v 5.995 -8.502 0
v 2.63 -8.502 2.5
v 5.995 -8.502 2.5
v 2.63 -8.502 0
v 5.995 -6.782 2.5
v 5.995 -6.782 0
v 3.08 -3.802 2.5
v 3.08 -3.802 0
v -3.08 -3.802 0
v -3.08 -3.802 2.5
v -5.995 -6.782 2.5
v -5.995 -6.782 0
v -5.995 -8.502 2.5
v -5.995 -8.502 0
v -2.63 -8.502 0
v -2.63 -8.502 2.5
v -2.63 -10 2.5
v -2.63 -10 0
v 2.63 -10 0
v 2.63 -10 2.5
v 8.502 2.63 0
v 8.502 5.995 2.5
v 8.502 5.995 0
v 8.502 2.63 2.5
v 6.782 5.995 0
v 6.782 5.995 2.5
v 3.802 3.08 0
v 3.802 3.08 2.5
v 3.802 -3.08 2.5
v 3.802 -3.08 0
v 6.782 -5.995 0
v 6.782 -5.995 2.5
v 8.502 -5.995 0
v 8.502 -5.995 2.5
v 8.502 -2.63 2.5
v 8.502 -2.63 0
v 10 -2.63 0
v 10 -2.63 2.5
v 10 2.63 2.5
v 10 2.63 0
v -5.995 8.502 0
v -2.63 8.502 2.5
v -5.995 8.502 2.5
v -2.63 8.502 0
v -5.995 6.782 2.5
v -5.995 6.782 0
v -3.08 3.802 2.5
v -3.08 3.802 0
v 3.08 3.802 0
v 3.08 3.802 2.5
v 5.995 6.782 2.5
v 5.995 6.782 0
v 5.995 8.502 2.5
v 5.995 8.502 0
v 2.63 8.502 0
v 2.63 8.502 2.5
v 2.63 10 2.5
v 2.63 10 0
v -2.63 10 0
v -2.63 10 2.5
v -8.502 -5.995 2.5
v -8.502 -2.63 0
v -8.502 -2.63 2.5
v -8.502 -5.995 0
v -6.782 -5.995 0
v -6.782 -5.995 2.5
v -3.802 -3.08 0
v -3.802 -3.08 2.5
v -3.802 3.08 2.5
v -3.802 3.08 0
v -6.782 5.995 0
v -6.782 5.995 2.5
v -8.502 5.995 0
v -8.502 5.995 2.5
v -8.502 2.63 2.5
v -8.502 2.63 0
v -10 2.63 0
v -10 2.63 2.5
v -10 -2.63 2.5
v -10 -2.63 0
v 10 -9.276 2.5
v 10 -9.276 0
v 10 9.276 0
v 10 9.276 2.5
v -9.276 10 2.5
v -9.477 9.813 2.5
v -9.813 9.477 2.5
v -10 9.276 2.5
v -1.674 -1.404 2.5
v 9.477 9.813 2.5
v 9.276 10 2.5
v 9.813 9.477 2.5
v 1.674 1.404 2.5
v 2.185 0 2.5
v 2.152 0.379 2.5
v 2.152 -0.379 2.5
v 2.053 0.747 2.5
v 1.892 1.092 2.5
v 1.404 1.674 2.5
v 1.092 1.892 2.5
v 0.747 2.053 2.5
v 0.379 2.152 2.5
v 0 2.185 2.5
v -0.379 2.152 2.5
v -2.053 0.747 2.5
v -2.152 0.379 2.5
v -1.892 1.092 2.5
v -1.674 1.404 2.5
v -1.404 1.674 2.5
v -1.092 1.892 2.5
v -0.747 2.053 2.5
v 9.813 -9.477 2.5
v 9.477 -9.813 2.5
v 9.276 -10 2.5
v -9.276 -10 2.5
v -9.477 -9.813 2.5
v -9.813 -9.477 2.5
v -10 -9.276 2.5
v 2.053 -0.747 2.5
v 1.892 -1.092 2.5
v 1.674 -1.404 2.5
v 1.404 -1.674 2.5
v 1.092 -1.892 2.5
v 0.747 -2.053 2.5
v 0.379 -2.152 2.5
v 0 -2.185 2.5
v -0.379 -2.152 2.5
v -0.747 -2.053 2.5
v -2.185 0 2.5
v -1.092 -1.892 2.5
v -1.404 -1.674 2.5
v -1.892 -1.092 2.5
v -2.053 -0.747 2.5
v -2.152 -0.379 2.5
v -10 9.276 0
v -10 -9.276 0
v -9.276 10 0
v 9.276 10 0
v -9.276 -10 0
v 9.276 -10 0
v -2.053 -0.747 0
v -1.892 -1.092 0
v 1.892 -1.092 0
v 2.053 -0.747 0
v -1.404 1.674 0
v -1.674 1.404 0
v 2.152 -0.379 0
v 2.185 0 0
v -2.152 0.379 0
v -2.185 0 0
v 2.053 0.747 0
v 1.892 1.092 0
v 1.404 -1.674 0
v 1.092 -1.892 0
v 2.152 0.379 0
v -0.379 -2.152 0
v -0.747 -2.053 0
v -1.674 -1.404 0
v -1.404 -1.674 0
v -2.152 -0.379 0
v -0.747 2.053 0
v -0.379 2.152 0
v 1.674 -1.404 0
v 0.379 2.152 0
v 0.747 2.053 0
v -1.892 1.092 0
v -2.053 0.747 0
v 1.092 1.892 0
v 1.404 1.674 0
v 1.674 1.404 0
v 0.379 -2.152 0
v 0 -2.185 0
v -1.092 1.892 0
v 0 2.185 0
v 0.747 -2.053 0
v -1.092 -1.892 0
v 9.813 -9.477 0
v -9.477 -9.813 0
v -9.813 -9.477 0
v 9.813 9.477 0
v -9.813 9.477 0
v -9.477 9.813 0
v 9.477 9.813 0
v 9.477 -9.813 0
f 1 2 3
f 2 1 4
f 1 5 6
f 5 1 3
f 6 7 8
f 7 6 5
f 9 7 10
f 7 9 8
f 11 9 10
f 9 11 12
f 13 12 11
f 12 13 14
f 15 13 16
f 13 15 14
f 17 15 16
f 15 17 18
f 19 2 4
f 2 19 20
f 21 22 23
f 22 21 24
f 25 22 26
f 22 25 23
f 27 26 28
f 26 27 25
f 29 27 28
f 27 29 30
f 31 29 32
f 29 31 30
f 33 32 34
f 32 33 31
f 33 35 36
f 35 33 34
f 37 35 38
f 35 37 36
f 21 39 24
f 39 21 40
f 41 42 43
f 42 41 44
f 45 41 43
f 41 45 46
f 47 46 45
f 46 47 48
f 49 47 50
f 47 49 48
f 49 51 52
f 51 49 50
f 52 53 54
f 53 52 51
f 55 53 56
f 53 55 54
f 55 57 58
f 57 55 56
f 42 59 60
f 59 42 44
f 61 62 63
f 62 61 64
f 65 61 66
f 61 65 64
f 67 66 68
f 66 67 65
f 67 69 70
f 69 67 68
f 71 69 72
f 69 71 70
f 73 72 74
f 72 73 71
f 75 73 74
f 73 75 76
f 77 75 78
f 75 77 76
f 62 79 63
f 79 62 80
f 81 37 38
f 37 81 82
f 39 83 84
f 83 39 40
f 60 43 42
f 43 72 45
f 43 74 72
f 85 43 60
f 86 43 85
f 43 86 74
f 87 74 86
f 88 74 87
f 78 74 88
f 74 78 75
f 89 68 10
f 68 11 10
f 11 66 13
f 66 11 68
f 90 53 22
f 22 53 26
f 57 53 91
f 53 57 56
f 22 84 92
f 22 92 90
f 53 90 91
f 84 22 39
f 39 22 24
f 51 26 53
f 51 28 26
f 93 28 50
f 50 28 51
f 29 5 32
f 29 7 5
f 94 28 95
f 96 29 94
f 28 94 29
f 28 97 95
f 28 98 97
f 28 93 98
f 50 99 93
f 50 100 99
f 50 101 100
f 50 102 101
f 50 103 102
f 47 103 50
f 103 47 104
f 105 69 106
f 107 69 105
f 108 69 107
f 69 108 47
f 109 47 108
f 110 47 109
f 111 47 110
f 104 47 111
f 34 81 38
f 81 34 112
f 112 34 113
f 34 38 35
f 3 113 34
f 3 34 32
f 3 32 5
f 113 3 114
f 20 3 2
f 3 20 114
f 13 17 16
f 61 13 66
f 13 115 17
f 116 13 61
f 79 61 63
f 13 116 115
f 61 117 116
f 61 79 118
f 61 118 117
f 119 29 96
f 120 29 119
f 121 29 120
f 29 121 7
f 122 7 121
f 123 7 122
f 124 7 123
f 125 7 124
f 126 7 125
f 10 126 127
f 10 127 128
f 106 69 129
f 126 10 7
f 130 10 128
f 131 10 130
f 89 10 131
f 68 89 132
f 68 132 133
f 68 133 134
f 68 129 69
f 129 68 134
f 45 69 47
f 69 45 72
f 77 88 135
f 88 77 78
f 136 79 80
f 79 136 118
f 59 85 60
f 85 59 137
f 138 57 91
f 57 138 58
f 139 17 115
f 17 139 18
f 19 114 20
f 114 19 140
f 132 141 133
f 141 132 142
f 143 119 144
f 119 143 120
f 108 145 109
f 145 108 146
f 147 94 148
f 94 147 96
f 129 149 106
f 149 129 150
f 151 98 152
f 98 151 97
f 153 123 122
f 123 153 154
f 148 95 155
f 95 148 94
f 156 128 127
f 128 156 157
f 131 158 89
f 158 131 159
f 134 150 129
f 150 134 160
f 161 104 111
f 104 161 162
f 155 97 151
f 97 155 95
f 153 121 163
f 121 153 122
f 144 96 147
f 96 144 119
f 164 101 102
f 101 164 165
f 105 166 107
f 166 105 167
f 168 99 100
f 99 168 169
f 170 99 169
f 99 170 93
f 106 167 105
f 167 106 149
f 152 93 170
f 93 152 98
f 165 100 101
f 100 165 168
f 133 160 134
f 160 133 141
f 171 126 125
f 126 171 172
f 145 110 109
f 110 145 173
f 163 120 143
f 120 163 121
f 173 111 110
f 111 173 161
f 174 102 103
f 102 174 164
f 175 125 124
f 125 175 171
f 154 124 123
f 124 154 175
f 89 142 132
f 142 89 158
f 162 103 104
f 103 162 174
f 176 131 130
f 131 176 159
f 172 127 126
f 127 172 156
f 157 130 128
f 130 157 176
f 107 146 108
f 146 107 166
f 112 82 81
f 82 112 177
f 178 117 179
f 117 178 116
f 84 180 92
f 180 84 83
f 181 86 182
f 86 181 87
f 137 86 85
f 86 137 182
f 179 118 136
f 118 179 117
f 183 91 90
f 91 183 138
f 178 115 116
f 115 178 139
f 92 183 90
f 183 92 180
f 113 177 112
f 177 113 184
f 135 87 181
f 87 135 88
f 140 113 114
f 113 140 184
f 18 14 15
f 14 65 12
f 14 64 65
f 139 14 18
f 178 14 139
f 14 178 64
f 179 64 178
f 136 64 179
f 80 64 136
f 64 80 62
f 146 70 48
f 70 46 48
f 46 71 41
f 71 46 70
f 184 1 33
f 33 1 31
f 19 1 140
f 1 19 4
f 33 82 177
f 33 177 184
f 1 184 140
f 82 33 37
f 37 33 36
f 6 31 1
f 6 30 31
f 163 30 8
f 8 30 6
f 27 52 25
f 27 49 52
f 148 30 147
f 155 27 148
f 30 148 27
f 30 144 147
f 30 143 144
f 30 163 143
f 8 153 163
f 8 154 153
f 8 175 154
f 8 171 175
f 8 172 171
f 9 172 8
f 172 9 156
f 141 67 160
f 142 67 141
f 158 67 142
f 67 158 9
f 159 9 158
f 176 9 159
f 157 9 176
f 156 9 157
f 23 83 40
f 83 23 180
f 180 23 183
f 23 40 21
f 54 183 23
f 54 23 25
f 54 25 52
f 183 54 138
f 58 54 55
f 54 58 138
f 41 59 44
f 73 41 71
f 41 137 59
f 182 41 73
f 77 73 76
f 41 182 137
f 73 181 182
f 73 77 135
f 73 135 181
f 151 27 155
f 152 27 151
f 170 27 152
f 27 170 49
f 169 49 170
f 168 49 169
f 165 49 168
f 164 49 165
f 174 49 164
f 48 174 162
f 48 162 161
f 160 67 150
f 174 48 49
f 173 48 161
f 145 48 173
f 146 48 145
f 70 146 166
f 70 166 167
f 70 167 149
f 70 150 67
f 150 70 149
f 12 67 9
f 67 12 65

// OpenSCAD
//
//  Generate what is HOPEFULLY a close to typical
//  2020 aluminum extrusion shape.
//
//  Copyright (c) 2020 Sarah Kelley, sarah@sakelley.org
//  First version 5/19/2020.
//
//  Permission is hereby granted, free of charge, to any person obtaining a copy
//  of this software and associated documentation files (the "Software"), to deal
//  in the Software without restriction, including without limitation the rights
//  to use, copy, modify, merge, publish, distribute, sublicense, and/or sell
//  copies of the Software, and to permit persons to whom the Software is
//  furnished to do so, subject to the following conditions:
//  
//  The above copyright notice and this permission notice shall be included in all
//  copies or substantial portions of the Software.
//  
//  THE SOFTWARE IS PROVIDED "AS IS", WITHOUT WARRANTY OF ANY KIND, EXPRESS OR
//  IMPLIED, INCLUDING BUT NOT LIMITED TO THE WARRANTIES OF MERCHANTABILITY,
//  FITNESS FOR A PARTICULAR PURPOSE AND NONINFRINGEMENT. IN NO EVENT SHALL THE
//  AUTHORS OR COPYRIGHT HOLDERS BE LIABLE FOR ANY CLAIM, DAMAGES OR OTHER
//  LIABILITY, WHETHER IN AN ACTION OF CONTRACT, TORT OR OTHERWISE, ARISING FROM,
//  OUT OF OR IN CONNECTION WITH THE SOFTWARE OR THE USE OR OTHER DEALINGS IN THE
//  SOFTWARE.
//


module Extrusion2020(
    h=10,                     // height of the extrusion to generate
    centerDiameter=4.37,      // diameter of the center hole
    roundCornerAmount=0,      // if more than zero, round the corners this much 
    tolerance = 1.0) {        // adjust some tolerances "a little bit"
    
    // Slight tolerance adjustment to make things look right in preview
    diffTolerance = 0.002;

    // Most of the dimensions for the inner channel are taken
    // from a mechanical drawing I found at 8020.net.
    // The only value I couldn't find I labeled mv for mysteryValue
    // and measured the extrusion on my 3D printer for what I hope
    // will be a reasonable value.
    // Hopefully this little diagram will make it easier to visualize.
    // (Use a monospace font!)
    //
    //        0,0 x1  x2    y1
    //      |     |          
    // ------     -----     y2
    // |              |         "mystery value"
    //  \            /      y3
    //   \----------/
    //             x3       y4
    //
    module inner_channel_outline(
        t = 1 // tolerance, to make a little bigger or smaller
    ) {
        mv = (1.72 * t);   // mystery value, not on drawing I have.
        mv2 = 0.45;
        x1 = (5.26 / 2) * t;   // from drawing
        x2 = (11.99 / 2) * t;  // from drawing
        x3 = x1 + mv2;         // eyeball/wild-ass guess. looks like they line up.
        y1 = 0;          // our starting point!
        y2 = (1.5 * t);        // from drawing
        y4 = (4.70 + y2) * t;  // from drawing
        y3 = (y2 + mv) * t;    // not on drawing.
        polygon([[x1,y1],[x1,y2],[x2,y2],[x2,y3],[x3,y4],
            [-x3,y4],[-x2,y3],[-x2,y2],[-x2,y2],[-x1,y2],
            [-x1,y1],[x1,y1]]);
    }

    intersection() {
        
        difference() {
            
            // The outline of the extrusion
            cube([20,20,h], center=true);
            
            // The hole down the center
            cylinder(h=h + diffTolerance, d=centerDiameter, center=true, $fn=36);
            
            // The inner channels on the four sides
            for (r=[0, 90, 180, 270]) 
                rotate([0,0,r]) 
                    translate([0,-10-diffTolerance,0]) 
                        linear_extrude(
                                height=h+diffTolerance, 
                                center=true, 
                                convexity=10)
                            inner_channel_outline(t=tolerance);
        }
        
        // Round the corners if requested
        maxRoundCornerDiameter = sqrt(20*20 + 20*20);
        if (roundCornerAmount > 0)  
            cylinder(h = h + diffTolerance, 
                d = maxRoundCornerDiameter-roundCornerAmount,
                $fn = 180);
    }
}
Extrusion2020(5, roundCornerAmount=1);
